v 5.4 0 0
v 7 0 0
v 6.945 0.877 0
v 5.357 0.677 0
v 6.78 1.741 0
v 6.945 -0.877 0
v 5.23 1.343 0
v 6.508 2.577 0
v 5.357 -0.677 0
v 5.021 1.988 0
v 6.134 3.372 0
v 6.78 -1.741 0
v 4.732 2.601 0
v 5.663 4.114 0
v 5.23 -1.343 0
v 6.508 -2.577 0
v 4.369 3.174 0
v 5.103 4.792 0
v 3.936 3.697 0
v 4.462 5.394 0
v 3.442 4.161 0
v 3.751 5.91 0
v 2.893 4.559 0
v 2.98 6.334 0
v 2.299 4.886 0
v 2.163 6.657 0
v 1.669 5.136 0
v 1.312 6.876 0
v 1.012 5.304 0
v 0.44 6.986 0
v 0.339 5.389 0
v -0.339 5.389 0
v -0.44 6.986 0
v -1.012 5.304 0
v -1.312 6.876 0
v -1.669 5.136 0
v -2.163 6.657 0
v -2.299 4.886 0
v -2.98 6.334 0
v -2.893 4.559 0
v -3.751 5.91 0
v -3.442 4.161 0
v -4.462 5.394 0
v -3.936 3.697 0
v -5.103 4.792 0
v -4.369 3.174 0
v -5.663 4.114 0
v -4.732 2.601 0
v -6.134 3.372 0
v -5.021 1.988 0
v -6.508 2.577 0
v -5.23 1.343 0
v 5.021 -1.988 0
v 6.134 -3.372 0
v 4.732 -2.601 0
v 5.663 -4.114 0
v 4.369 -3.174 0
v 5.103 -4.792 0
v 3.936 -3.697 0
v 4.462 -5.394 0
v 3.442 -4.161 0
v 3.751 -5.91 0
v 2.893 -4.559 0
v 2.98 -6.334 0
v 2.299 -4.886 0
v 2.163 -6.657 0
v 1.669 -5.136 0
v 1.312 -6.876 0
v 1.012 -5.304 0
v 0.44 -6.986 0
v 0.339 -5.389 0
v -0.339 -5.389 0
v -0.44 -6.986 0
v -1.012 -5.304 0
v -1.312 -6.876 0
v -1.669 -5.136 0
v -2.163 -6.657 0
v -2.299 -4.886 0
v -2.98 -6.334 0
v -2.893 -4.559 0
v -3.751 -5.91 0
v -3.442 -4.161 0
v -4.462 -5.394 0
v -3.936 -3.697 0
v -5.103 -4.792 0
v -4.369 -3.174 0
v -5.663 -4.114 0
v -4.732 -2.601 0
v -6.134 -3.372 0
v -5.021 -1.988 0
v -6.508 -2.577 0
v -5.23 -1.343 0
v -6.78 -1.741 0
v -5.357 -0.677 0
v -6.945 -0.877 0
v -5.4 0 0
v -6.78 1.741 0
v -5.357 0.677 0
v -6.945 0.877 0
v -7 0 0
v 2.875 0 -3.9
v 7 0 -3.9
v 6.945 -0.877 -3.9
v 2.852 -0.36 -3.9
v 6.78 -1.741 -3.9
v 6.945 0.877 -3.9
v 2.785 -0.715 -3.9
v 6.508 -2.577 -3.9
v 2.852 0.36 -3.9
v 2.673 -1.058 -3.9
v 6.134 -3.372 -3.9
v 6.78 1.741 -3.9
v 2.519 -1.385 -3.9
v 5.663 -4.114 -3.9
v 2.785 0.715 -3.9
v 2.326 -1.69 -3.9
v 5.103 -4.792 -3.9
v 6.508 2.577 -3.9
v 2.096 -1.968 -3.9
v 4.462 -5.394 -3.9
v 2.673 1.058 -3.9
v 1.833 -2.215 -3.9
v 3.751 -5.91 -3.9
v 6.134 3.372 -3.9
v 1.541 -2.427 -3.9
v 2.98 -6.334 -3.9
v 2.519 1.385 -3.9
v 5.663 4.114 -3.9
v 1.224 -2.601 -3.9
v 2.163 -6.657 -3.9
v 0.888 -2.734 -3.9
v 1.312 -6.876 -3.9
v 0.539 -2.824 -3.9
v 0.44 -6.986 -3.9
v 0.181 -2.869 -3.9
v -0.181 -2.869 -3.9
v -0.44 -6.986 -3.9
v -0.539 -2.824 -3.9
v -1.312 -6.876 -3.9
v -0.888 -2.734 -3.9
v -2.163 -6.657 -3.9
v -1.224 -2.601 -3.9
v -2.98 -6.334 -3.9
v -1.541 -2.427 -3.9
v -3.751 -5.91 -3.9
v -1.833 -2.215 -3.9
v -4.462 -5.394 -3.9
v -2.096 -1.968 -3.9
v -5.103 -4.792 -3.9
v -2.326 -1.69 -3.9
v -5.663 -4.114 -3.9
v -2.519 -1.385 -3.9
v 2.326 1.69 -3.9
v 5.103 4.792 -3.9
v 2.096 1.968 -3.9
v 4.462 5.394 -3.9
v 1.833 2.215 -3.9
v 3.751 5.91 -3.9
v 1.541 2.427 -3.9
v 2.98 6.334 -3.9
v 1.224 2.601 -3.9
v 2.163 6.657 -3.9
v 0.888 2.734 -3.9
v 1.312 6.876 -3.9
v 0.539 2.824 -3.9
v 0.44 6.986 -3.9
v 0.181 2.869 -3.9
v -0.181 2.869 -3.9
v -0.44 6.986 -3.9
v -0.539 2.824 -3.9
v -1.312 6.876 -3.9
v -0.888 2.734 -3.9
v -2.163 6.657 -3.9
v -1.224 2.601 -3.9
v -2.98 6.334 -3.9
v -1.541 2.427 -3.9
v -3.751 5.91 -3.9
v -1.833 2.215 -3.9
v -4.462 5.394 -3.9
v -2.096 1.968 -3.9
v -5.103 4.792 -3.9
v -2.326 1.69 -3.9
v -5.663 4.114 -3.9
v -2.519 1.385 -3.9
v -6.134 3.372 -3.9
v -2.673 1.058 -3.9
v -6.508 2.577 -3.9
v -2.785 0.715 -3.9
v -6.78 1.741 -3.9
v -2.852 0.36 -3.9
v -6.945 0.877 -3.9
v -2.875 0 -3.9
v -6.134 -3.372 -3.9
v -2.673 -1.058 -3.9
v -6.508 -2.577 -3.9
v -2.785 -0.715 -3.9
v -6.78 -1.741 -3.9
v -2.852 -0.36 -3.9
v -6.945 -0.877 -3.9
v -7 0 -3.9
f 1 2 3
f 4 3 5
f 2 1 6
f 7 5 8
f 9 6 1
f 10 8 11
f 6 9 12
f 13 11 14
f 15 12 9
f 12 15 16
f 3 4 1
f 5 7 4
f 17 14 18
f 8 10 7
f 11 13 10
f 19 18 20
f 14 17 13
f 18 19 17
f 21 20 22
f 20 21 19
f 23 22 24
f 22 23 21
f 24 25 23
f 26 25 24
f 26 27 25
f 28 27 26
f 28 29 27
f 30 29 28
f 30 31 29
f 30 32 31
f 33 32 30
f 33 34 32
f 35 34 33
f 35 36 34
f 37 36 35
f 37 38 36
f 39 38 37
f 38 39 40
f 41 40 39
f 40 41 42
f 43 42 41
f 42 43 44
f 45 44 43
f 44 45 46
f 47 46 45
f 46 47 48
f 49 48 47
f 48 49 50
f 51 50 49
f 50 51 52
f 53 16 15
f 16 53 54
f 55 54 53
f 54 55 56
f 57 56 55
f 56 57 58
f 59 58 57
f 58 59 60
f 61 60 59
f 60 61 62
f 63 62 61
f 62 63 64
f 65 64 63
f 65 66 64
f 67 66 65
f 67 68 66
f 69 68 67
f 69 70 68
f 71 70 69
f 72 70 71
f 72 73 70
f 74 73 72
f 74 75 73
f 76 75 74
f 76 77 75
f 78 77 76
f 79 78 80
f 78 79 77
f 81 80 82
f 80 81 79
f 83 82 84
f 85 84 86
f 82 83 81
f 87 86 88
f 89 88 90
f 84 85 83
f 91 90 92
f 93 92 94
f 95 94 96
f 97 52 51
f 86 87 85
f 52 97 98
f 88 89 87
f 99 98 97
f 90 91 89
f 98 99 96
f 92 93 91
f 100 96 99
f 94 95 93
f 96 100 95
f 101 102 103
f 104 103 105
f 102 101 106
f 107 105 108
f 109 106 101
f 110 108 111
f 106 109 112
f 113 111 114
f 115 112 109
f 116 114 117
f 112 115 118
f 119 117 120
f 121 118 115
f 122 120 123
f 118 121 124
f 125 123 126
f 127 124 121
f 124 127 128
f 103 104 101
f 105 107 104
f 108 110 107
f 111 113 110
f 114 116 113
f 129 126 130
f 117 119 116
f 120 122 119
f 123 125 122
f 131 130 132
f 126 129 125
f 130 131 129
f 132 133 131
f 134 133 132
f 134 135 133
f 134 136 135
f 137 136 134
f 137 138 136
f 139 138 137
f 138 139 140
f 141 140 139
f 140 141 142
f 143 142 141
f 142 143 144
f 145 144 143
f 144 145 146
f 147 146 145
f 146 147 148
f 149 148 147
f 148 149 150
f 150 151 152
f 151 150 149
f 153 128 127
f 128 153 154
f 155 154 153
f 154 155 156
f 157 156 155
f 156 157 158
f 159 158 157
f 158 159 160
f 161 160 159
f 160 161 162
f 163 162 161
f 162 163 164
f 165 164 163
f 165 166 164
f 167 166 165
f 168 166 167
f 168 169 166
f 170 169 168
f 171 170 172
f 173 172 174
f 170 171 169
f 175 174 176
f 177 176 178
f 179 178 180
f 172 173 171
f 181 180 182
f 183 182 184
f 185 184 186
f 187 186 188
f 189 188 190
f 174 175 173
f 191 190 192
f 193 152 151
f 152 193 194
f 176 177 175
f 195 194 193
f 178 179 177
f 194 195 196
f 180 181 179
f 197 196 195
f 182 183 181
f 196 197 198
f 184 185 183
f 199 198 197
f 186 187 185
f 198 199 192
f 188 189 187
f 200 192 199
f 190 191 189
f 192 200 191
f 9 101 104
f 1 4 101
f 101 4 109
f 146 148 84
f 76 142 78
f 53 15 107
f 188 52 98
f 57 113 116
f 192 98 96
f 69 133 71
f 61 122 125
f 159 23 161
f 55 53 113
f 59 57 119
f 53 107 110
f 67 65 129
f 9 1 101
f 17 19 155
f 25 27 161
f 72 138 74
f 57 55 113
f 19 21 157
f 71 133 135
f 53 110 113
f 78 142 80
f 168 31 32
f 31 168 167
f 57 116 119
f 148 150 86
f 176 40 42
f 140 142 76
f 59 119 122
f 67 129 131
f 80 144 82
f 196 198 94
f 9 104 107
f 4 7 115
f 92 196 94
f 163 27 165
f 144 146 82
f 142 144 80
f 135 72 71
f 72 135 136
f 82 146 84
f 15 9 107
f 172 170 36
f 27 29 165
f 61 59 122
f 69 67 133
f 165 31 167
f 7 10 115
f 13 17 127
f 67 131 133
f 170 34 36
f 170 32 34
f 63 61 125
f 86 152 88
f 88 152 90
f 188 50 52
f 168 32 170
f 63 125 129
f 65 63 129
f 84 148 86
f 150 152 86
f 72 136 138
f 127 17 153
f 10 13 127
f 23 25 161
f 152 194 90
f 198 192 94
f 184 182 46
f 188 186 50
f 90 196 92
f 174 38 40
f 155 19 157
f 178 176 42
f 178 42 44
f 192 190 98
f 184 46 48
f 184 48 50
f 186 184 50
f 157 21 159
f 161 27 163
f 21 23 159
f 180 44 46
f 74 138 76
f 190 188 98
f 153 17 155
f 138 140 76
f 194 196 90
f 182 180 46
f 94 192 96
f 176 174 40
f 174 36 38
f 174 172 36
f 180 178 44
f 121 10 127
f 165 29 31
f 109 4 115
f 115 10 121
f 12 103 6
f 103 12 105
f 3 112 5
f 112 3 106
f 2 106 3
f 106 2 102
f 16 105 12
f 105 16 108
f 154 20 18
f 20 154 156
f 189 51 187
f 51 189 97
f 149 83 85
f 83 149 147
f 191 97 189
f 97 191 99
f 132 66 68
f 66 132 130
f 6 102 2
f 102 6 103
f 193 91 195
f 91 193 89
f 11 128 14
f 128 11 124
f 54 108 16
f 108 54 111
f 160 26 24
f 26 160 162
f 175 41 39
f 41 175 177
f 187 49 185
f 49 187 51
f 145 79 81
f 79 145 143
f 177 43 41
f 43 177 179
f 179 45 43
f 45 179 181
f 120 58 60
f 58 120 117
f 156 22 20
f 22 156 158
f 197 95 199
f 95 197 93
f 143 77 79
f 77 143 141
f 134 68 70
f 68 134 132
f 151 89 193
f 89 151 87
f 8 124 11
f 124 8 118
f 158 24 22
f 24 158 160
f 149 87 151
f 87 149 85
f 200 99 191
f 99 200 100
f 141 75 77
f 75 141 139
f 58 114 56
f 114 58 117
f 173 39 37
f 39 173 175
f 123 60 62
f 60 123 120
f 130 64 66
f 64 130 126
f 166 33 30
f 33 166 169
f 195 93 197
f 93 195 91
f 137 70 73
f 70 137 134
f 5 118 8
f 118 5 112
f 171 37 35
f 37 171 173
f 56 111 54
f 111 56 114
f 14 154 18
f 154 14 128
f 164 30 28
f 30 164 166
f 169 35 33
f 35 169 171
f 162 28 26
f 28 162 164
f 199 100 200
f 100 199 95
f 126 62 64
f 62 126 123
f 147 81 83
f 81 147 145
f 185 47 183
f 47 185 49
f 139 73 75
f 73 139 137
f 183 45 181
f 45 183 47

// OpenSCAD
$fn = 50;


difference() {
	union() {
		translate(v = [0, 0, -3.9000000000]) {
			cylinder(h = 3.9000000000, r = 7.0000000000);
		}
	}
	union() {
		translate(v = [0, 0, 0]) {
			rotate(a = [0, 0, 0]) {
				difference() {
					union() {
						translate(v = [0, 0, -3.9000000000]) {
							cylinder(h = 3.9000000000, r = 2.6000000000);
						}
						translate(v = [0, 0, -3.9000000000]) {
							cylinder(h = 3.9000000000, r1 = 2.8750000000, r2 = 5.4000000000);
						}
						translate(v = [0, 0, -3.9000000000]) {
							cylinder(h = 3.9000000000, r = 2.8750000000);
						}
						translate(v = [0, 0, -3.9000000000]) {
							cylinder(h = 3.9000000000, r = 2.6000000000);
						}
					}
					union();
				}
			}
		}
	}
}
